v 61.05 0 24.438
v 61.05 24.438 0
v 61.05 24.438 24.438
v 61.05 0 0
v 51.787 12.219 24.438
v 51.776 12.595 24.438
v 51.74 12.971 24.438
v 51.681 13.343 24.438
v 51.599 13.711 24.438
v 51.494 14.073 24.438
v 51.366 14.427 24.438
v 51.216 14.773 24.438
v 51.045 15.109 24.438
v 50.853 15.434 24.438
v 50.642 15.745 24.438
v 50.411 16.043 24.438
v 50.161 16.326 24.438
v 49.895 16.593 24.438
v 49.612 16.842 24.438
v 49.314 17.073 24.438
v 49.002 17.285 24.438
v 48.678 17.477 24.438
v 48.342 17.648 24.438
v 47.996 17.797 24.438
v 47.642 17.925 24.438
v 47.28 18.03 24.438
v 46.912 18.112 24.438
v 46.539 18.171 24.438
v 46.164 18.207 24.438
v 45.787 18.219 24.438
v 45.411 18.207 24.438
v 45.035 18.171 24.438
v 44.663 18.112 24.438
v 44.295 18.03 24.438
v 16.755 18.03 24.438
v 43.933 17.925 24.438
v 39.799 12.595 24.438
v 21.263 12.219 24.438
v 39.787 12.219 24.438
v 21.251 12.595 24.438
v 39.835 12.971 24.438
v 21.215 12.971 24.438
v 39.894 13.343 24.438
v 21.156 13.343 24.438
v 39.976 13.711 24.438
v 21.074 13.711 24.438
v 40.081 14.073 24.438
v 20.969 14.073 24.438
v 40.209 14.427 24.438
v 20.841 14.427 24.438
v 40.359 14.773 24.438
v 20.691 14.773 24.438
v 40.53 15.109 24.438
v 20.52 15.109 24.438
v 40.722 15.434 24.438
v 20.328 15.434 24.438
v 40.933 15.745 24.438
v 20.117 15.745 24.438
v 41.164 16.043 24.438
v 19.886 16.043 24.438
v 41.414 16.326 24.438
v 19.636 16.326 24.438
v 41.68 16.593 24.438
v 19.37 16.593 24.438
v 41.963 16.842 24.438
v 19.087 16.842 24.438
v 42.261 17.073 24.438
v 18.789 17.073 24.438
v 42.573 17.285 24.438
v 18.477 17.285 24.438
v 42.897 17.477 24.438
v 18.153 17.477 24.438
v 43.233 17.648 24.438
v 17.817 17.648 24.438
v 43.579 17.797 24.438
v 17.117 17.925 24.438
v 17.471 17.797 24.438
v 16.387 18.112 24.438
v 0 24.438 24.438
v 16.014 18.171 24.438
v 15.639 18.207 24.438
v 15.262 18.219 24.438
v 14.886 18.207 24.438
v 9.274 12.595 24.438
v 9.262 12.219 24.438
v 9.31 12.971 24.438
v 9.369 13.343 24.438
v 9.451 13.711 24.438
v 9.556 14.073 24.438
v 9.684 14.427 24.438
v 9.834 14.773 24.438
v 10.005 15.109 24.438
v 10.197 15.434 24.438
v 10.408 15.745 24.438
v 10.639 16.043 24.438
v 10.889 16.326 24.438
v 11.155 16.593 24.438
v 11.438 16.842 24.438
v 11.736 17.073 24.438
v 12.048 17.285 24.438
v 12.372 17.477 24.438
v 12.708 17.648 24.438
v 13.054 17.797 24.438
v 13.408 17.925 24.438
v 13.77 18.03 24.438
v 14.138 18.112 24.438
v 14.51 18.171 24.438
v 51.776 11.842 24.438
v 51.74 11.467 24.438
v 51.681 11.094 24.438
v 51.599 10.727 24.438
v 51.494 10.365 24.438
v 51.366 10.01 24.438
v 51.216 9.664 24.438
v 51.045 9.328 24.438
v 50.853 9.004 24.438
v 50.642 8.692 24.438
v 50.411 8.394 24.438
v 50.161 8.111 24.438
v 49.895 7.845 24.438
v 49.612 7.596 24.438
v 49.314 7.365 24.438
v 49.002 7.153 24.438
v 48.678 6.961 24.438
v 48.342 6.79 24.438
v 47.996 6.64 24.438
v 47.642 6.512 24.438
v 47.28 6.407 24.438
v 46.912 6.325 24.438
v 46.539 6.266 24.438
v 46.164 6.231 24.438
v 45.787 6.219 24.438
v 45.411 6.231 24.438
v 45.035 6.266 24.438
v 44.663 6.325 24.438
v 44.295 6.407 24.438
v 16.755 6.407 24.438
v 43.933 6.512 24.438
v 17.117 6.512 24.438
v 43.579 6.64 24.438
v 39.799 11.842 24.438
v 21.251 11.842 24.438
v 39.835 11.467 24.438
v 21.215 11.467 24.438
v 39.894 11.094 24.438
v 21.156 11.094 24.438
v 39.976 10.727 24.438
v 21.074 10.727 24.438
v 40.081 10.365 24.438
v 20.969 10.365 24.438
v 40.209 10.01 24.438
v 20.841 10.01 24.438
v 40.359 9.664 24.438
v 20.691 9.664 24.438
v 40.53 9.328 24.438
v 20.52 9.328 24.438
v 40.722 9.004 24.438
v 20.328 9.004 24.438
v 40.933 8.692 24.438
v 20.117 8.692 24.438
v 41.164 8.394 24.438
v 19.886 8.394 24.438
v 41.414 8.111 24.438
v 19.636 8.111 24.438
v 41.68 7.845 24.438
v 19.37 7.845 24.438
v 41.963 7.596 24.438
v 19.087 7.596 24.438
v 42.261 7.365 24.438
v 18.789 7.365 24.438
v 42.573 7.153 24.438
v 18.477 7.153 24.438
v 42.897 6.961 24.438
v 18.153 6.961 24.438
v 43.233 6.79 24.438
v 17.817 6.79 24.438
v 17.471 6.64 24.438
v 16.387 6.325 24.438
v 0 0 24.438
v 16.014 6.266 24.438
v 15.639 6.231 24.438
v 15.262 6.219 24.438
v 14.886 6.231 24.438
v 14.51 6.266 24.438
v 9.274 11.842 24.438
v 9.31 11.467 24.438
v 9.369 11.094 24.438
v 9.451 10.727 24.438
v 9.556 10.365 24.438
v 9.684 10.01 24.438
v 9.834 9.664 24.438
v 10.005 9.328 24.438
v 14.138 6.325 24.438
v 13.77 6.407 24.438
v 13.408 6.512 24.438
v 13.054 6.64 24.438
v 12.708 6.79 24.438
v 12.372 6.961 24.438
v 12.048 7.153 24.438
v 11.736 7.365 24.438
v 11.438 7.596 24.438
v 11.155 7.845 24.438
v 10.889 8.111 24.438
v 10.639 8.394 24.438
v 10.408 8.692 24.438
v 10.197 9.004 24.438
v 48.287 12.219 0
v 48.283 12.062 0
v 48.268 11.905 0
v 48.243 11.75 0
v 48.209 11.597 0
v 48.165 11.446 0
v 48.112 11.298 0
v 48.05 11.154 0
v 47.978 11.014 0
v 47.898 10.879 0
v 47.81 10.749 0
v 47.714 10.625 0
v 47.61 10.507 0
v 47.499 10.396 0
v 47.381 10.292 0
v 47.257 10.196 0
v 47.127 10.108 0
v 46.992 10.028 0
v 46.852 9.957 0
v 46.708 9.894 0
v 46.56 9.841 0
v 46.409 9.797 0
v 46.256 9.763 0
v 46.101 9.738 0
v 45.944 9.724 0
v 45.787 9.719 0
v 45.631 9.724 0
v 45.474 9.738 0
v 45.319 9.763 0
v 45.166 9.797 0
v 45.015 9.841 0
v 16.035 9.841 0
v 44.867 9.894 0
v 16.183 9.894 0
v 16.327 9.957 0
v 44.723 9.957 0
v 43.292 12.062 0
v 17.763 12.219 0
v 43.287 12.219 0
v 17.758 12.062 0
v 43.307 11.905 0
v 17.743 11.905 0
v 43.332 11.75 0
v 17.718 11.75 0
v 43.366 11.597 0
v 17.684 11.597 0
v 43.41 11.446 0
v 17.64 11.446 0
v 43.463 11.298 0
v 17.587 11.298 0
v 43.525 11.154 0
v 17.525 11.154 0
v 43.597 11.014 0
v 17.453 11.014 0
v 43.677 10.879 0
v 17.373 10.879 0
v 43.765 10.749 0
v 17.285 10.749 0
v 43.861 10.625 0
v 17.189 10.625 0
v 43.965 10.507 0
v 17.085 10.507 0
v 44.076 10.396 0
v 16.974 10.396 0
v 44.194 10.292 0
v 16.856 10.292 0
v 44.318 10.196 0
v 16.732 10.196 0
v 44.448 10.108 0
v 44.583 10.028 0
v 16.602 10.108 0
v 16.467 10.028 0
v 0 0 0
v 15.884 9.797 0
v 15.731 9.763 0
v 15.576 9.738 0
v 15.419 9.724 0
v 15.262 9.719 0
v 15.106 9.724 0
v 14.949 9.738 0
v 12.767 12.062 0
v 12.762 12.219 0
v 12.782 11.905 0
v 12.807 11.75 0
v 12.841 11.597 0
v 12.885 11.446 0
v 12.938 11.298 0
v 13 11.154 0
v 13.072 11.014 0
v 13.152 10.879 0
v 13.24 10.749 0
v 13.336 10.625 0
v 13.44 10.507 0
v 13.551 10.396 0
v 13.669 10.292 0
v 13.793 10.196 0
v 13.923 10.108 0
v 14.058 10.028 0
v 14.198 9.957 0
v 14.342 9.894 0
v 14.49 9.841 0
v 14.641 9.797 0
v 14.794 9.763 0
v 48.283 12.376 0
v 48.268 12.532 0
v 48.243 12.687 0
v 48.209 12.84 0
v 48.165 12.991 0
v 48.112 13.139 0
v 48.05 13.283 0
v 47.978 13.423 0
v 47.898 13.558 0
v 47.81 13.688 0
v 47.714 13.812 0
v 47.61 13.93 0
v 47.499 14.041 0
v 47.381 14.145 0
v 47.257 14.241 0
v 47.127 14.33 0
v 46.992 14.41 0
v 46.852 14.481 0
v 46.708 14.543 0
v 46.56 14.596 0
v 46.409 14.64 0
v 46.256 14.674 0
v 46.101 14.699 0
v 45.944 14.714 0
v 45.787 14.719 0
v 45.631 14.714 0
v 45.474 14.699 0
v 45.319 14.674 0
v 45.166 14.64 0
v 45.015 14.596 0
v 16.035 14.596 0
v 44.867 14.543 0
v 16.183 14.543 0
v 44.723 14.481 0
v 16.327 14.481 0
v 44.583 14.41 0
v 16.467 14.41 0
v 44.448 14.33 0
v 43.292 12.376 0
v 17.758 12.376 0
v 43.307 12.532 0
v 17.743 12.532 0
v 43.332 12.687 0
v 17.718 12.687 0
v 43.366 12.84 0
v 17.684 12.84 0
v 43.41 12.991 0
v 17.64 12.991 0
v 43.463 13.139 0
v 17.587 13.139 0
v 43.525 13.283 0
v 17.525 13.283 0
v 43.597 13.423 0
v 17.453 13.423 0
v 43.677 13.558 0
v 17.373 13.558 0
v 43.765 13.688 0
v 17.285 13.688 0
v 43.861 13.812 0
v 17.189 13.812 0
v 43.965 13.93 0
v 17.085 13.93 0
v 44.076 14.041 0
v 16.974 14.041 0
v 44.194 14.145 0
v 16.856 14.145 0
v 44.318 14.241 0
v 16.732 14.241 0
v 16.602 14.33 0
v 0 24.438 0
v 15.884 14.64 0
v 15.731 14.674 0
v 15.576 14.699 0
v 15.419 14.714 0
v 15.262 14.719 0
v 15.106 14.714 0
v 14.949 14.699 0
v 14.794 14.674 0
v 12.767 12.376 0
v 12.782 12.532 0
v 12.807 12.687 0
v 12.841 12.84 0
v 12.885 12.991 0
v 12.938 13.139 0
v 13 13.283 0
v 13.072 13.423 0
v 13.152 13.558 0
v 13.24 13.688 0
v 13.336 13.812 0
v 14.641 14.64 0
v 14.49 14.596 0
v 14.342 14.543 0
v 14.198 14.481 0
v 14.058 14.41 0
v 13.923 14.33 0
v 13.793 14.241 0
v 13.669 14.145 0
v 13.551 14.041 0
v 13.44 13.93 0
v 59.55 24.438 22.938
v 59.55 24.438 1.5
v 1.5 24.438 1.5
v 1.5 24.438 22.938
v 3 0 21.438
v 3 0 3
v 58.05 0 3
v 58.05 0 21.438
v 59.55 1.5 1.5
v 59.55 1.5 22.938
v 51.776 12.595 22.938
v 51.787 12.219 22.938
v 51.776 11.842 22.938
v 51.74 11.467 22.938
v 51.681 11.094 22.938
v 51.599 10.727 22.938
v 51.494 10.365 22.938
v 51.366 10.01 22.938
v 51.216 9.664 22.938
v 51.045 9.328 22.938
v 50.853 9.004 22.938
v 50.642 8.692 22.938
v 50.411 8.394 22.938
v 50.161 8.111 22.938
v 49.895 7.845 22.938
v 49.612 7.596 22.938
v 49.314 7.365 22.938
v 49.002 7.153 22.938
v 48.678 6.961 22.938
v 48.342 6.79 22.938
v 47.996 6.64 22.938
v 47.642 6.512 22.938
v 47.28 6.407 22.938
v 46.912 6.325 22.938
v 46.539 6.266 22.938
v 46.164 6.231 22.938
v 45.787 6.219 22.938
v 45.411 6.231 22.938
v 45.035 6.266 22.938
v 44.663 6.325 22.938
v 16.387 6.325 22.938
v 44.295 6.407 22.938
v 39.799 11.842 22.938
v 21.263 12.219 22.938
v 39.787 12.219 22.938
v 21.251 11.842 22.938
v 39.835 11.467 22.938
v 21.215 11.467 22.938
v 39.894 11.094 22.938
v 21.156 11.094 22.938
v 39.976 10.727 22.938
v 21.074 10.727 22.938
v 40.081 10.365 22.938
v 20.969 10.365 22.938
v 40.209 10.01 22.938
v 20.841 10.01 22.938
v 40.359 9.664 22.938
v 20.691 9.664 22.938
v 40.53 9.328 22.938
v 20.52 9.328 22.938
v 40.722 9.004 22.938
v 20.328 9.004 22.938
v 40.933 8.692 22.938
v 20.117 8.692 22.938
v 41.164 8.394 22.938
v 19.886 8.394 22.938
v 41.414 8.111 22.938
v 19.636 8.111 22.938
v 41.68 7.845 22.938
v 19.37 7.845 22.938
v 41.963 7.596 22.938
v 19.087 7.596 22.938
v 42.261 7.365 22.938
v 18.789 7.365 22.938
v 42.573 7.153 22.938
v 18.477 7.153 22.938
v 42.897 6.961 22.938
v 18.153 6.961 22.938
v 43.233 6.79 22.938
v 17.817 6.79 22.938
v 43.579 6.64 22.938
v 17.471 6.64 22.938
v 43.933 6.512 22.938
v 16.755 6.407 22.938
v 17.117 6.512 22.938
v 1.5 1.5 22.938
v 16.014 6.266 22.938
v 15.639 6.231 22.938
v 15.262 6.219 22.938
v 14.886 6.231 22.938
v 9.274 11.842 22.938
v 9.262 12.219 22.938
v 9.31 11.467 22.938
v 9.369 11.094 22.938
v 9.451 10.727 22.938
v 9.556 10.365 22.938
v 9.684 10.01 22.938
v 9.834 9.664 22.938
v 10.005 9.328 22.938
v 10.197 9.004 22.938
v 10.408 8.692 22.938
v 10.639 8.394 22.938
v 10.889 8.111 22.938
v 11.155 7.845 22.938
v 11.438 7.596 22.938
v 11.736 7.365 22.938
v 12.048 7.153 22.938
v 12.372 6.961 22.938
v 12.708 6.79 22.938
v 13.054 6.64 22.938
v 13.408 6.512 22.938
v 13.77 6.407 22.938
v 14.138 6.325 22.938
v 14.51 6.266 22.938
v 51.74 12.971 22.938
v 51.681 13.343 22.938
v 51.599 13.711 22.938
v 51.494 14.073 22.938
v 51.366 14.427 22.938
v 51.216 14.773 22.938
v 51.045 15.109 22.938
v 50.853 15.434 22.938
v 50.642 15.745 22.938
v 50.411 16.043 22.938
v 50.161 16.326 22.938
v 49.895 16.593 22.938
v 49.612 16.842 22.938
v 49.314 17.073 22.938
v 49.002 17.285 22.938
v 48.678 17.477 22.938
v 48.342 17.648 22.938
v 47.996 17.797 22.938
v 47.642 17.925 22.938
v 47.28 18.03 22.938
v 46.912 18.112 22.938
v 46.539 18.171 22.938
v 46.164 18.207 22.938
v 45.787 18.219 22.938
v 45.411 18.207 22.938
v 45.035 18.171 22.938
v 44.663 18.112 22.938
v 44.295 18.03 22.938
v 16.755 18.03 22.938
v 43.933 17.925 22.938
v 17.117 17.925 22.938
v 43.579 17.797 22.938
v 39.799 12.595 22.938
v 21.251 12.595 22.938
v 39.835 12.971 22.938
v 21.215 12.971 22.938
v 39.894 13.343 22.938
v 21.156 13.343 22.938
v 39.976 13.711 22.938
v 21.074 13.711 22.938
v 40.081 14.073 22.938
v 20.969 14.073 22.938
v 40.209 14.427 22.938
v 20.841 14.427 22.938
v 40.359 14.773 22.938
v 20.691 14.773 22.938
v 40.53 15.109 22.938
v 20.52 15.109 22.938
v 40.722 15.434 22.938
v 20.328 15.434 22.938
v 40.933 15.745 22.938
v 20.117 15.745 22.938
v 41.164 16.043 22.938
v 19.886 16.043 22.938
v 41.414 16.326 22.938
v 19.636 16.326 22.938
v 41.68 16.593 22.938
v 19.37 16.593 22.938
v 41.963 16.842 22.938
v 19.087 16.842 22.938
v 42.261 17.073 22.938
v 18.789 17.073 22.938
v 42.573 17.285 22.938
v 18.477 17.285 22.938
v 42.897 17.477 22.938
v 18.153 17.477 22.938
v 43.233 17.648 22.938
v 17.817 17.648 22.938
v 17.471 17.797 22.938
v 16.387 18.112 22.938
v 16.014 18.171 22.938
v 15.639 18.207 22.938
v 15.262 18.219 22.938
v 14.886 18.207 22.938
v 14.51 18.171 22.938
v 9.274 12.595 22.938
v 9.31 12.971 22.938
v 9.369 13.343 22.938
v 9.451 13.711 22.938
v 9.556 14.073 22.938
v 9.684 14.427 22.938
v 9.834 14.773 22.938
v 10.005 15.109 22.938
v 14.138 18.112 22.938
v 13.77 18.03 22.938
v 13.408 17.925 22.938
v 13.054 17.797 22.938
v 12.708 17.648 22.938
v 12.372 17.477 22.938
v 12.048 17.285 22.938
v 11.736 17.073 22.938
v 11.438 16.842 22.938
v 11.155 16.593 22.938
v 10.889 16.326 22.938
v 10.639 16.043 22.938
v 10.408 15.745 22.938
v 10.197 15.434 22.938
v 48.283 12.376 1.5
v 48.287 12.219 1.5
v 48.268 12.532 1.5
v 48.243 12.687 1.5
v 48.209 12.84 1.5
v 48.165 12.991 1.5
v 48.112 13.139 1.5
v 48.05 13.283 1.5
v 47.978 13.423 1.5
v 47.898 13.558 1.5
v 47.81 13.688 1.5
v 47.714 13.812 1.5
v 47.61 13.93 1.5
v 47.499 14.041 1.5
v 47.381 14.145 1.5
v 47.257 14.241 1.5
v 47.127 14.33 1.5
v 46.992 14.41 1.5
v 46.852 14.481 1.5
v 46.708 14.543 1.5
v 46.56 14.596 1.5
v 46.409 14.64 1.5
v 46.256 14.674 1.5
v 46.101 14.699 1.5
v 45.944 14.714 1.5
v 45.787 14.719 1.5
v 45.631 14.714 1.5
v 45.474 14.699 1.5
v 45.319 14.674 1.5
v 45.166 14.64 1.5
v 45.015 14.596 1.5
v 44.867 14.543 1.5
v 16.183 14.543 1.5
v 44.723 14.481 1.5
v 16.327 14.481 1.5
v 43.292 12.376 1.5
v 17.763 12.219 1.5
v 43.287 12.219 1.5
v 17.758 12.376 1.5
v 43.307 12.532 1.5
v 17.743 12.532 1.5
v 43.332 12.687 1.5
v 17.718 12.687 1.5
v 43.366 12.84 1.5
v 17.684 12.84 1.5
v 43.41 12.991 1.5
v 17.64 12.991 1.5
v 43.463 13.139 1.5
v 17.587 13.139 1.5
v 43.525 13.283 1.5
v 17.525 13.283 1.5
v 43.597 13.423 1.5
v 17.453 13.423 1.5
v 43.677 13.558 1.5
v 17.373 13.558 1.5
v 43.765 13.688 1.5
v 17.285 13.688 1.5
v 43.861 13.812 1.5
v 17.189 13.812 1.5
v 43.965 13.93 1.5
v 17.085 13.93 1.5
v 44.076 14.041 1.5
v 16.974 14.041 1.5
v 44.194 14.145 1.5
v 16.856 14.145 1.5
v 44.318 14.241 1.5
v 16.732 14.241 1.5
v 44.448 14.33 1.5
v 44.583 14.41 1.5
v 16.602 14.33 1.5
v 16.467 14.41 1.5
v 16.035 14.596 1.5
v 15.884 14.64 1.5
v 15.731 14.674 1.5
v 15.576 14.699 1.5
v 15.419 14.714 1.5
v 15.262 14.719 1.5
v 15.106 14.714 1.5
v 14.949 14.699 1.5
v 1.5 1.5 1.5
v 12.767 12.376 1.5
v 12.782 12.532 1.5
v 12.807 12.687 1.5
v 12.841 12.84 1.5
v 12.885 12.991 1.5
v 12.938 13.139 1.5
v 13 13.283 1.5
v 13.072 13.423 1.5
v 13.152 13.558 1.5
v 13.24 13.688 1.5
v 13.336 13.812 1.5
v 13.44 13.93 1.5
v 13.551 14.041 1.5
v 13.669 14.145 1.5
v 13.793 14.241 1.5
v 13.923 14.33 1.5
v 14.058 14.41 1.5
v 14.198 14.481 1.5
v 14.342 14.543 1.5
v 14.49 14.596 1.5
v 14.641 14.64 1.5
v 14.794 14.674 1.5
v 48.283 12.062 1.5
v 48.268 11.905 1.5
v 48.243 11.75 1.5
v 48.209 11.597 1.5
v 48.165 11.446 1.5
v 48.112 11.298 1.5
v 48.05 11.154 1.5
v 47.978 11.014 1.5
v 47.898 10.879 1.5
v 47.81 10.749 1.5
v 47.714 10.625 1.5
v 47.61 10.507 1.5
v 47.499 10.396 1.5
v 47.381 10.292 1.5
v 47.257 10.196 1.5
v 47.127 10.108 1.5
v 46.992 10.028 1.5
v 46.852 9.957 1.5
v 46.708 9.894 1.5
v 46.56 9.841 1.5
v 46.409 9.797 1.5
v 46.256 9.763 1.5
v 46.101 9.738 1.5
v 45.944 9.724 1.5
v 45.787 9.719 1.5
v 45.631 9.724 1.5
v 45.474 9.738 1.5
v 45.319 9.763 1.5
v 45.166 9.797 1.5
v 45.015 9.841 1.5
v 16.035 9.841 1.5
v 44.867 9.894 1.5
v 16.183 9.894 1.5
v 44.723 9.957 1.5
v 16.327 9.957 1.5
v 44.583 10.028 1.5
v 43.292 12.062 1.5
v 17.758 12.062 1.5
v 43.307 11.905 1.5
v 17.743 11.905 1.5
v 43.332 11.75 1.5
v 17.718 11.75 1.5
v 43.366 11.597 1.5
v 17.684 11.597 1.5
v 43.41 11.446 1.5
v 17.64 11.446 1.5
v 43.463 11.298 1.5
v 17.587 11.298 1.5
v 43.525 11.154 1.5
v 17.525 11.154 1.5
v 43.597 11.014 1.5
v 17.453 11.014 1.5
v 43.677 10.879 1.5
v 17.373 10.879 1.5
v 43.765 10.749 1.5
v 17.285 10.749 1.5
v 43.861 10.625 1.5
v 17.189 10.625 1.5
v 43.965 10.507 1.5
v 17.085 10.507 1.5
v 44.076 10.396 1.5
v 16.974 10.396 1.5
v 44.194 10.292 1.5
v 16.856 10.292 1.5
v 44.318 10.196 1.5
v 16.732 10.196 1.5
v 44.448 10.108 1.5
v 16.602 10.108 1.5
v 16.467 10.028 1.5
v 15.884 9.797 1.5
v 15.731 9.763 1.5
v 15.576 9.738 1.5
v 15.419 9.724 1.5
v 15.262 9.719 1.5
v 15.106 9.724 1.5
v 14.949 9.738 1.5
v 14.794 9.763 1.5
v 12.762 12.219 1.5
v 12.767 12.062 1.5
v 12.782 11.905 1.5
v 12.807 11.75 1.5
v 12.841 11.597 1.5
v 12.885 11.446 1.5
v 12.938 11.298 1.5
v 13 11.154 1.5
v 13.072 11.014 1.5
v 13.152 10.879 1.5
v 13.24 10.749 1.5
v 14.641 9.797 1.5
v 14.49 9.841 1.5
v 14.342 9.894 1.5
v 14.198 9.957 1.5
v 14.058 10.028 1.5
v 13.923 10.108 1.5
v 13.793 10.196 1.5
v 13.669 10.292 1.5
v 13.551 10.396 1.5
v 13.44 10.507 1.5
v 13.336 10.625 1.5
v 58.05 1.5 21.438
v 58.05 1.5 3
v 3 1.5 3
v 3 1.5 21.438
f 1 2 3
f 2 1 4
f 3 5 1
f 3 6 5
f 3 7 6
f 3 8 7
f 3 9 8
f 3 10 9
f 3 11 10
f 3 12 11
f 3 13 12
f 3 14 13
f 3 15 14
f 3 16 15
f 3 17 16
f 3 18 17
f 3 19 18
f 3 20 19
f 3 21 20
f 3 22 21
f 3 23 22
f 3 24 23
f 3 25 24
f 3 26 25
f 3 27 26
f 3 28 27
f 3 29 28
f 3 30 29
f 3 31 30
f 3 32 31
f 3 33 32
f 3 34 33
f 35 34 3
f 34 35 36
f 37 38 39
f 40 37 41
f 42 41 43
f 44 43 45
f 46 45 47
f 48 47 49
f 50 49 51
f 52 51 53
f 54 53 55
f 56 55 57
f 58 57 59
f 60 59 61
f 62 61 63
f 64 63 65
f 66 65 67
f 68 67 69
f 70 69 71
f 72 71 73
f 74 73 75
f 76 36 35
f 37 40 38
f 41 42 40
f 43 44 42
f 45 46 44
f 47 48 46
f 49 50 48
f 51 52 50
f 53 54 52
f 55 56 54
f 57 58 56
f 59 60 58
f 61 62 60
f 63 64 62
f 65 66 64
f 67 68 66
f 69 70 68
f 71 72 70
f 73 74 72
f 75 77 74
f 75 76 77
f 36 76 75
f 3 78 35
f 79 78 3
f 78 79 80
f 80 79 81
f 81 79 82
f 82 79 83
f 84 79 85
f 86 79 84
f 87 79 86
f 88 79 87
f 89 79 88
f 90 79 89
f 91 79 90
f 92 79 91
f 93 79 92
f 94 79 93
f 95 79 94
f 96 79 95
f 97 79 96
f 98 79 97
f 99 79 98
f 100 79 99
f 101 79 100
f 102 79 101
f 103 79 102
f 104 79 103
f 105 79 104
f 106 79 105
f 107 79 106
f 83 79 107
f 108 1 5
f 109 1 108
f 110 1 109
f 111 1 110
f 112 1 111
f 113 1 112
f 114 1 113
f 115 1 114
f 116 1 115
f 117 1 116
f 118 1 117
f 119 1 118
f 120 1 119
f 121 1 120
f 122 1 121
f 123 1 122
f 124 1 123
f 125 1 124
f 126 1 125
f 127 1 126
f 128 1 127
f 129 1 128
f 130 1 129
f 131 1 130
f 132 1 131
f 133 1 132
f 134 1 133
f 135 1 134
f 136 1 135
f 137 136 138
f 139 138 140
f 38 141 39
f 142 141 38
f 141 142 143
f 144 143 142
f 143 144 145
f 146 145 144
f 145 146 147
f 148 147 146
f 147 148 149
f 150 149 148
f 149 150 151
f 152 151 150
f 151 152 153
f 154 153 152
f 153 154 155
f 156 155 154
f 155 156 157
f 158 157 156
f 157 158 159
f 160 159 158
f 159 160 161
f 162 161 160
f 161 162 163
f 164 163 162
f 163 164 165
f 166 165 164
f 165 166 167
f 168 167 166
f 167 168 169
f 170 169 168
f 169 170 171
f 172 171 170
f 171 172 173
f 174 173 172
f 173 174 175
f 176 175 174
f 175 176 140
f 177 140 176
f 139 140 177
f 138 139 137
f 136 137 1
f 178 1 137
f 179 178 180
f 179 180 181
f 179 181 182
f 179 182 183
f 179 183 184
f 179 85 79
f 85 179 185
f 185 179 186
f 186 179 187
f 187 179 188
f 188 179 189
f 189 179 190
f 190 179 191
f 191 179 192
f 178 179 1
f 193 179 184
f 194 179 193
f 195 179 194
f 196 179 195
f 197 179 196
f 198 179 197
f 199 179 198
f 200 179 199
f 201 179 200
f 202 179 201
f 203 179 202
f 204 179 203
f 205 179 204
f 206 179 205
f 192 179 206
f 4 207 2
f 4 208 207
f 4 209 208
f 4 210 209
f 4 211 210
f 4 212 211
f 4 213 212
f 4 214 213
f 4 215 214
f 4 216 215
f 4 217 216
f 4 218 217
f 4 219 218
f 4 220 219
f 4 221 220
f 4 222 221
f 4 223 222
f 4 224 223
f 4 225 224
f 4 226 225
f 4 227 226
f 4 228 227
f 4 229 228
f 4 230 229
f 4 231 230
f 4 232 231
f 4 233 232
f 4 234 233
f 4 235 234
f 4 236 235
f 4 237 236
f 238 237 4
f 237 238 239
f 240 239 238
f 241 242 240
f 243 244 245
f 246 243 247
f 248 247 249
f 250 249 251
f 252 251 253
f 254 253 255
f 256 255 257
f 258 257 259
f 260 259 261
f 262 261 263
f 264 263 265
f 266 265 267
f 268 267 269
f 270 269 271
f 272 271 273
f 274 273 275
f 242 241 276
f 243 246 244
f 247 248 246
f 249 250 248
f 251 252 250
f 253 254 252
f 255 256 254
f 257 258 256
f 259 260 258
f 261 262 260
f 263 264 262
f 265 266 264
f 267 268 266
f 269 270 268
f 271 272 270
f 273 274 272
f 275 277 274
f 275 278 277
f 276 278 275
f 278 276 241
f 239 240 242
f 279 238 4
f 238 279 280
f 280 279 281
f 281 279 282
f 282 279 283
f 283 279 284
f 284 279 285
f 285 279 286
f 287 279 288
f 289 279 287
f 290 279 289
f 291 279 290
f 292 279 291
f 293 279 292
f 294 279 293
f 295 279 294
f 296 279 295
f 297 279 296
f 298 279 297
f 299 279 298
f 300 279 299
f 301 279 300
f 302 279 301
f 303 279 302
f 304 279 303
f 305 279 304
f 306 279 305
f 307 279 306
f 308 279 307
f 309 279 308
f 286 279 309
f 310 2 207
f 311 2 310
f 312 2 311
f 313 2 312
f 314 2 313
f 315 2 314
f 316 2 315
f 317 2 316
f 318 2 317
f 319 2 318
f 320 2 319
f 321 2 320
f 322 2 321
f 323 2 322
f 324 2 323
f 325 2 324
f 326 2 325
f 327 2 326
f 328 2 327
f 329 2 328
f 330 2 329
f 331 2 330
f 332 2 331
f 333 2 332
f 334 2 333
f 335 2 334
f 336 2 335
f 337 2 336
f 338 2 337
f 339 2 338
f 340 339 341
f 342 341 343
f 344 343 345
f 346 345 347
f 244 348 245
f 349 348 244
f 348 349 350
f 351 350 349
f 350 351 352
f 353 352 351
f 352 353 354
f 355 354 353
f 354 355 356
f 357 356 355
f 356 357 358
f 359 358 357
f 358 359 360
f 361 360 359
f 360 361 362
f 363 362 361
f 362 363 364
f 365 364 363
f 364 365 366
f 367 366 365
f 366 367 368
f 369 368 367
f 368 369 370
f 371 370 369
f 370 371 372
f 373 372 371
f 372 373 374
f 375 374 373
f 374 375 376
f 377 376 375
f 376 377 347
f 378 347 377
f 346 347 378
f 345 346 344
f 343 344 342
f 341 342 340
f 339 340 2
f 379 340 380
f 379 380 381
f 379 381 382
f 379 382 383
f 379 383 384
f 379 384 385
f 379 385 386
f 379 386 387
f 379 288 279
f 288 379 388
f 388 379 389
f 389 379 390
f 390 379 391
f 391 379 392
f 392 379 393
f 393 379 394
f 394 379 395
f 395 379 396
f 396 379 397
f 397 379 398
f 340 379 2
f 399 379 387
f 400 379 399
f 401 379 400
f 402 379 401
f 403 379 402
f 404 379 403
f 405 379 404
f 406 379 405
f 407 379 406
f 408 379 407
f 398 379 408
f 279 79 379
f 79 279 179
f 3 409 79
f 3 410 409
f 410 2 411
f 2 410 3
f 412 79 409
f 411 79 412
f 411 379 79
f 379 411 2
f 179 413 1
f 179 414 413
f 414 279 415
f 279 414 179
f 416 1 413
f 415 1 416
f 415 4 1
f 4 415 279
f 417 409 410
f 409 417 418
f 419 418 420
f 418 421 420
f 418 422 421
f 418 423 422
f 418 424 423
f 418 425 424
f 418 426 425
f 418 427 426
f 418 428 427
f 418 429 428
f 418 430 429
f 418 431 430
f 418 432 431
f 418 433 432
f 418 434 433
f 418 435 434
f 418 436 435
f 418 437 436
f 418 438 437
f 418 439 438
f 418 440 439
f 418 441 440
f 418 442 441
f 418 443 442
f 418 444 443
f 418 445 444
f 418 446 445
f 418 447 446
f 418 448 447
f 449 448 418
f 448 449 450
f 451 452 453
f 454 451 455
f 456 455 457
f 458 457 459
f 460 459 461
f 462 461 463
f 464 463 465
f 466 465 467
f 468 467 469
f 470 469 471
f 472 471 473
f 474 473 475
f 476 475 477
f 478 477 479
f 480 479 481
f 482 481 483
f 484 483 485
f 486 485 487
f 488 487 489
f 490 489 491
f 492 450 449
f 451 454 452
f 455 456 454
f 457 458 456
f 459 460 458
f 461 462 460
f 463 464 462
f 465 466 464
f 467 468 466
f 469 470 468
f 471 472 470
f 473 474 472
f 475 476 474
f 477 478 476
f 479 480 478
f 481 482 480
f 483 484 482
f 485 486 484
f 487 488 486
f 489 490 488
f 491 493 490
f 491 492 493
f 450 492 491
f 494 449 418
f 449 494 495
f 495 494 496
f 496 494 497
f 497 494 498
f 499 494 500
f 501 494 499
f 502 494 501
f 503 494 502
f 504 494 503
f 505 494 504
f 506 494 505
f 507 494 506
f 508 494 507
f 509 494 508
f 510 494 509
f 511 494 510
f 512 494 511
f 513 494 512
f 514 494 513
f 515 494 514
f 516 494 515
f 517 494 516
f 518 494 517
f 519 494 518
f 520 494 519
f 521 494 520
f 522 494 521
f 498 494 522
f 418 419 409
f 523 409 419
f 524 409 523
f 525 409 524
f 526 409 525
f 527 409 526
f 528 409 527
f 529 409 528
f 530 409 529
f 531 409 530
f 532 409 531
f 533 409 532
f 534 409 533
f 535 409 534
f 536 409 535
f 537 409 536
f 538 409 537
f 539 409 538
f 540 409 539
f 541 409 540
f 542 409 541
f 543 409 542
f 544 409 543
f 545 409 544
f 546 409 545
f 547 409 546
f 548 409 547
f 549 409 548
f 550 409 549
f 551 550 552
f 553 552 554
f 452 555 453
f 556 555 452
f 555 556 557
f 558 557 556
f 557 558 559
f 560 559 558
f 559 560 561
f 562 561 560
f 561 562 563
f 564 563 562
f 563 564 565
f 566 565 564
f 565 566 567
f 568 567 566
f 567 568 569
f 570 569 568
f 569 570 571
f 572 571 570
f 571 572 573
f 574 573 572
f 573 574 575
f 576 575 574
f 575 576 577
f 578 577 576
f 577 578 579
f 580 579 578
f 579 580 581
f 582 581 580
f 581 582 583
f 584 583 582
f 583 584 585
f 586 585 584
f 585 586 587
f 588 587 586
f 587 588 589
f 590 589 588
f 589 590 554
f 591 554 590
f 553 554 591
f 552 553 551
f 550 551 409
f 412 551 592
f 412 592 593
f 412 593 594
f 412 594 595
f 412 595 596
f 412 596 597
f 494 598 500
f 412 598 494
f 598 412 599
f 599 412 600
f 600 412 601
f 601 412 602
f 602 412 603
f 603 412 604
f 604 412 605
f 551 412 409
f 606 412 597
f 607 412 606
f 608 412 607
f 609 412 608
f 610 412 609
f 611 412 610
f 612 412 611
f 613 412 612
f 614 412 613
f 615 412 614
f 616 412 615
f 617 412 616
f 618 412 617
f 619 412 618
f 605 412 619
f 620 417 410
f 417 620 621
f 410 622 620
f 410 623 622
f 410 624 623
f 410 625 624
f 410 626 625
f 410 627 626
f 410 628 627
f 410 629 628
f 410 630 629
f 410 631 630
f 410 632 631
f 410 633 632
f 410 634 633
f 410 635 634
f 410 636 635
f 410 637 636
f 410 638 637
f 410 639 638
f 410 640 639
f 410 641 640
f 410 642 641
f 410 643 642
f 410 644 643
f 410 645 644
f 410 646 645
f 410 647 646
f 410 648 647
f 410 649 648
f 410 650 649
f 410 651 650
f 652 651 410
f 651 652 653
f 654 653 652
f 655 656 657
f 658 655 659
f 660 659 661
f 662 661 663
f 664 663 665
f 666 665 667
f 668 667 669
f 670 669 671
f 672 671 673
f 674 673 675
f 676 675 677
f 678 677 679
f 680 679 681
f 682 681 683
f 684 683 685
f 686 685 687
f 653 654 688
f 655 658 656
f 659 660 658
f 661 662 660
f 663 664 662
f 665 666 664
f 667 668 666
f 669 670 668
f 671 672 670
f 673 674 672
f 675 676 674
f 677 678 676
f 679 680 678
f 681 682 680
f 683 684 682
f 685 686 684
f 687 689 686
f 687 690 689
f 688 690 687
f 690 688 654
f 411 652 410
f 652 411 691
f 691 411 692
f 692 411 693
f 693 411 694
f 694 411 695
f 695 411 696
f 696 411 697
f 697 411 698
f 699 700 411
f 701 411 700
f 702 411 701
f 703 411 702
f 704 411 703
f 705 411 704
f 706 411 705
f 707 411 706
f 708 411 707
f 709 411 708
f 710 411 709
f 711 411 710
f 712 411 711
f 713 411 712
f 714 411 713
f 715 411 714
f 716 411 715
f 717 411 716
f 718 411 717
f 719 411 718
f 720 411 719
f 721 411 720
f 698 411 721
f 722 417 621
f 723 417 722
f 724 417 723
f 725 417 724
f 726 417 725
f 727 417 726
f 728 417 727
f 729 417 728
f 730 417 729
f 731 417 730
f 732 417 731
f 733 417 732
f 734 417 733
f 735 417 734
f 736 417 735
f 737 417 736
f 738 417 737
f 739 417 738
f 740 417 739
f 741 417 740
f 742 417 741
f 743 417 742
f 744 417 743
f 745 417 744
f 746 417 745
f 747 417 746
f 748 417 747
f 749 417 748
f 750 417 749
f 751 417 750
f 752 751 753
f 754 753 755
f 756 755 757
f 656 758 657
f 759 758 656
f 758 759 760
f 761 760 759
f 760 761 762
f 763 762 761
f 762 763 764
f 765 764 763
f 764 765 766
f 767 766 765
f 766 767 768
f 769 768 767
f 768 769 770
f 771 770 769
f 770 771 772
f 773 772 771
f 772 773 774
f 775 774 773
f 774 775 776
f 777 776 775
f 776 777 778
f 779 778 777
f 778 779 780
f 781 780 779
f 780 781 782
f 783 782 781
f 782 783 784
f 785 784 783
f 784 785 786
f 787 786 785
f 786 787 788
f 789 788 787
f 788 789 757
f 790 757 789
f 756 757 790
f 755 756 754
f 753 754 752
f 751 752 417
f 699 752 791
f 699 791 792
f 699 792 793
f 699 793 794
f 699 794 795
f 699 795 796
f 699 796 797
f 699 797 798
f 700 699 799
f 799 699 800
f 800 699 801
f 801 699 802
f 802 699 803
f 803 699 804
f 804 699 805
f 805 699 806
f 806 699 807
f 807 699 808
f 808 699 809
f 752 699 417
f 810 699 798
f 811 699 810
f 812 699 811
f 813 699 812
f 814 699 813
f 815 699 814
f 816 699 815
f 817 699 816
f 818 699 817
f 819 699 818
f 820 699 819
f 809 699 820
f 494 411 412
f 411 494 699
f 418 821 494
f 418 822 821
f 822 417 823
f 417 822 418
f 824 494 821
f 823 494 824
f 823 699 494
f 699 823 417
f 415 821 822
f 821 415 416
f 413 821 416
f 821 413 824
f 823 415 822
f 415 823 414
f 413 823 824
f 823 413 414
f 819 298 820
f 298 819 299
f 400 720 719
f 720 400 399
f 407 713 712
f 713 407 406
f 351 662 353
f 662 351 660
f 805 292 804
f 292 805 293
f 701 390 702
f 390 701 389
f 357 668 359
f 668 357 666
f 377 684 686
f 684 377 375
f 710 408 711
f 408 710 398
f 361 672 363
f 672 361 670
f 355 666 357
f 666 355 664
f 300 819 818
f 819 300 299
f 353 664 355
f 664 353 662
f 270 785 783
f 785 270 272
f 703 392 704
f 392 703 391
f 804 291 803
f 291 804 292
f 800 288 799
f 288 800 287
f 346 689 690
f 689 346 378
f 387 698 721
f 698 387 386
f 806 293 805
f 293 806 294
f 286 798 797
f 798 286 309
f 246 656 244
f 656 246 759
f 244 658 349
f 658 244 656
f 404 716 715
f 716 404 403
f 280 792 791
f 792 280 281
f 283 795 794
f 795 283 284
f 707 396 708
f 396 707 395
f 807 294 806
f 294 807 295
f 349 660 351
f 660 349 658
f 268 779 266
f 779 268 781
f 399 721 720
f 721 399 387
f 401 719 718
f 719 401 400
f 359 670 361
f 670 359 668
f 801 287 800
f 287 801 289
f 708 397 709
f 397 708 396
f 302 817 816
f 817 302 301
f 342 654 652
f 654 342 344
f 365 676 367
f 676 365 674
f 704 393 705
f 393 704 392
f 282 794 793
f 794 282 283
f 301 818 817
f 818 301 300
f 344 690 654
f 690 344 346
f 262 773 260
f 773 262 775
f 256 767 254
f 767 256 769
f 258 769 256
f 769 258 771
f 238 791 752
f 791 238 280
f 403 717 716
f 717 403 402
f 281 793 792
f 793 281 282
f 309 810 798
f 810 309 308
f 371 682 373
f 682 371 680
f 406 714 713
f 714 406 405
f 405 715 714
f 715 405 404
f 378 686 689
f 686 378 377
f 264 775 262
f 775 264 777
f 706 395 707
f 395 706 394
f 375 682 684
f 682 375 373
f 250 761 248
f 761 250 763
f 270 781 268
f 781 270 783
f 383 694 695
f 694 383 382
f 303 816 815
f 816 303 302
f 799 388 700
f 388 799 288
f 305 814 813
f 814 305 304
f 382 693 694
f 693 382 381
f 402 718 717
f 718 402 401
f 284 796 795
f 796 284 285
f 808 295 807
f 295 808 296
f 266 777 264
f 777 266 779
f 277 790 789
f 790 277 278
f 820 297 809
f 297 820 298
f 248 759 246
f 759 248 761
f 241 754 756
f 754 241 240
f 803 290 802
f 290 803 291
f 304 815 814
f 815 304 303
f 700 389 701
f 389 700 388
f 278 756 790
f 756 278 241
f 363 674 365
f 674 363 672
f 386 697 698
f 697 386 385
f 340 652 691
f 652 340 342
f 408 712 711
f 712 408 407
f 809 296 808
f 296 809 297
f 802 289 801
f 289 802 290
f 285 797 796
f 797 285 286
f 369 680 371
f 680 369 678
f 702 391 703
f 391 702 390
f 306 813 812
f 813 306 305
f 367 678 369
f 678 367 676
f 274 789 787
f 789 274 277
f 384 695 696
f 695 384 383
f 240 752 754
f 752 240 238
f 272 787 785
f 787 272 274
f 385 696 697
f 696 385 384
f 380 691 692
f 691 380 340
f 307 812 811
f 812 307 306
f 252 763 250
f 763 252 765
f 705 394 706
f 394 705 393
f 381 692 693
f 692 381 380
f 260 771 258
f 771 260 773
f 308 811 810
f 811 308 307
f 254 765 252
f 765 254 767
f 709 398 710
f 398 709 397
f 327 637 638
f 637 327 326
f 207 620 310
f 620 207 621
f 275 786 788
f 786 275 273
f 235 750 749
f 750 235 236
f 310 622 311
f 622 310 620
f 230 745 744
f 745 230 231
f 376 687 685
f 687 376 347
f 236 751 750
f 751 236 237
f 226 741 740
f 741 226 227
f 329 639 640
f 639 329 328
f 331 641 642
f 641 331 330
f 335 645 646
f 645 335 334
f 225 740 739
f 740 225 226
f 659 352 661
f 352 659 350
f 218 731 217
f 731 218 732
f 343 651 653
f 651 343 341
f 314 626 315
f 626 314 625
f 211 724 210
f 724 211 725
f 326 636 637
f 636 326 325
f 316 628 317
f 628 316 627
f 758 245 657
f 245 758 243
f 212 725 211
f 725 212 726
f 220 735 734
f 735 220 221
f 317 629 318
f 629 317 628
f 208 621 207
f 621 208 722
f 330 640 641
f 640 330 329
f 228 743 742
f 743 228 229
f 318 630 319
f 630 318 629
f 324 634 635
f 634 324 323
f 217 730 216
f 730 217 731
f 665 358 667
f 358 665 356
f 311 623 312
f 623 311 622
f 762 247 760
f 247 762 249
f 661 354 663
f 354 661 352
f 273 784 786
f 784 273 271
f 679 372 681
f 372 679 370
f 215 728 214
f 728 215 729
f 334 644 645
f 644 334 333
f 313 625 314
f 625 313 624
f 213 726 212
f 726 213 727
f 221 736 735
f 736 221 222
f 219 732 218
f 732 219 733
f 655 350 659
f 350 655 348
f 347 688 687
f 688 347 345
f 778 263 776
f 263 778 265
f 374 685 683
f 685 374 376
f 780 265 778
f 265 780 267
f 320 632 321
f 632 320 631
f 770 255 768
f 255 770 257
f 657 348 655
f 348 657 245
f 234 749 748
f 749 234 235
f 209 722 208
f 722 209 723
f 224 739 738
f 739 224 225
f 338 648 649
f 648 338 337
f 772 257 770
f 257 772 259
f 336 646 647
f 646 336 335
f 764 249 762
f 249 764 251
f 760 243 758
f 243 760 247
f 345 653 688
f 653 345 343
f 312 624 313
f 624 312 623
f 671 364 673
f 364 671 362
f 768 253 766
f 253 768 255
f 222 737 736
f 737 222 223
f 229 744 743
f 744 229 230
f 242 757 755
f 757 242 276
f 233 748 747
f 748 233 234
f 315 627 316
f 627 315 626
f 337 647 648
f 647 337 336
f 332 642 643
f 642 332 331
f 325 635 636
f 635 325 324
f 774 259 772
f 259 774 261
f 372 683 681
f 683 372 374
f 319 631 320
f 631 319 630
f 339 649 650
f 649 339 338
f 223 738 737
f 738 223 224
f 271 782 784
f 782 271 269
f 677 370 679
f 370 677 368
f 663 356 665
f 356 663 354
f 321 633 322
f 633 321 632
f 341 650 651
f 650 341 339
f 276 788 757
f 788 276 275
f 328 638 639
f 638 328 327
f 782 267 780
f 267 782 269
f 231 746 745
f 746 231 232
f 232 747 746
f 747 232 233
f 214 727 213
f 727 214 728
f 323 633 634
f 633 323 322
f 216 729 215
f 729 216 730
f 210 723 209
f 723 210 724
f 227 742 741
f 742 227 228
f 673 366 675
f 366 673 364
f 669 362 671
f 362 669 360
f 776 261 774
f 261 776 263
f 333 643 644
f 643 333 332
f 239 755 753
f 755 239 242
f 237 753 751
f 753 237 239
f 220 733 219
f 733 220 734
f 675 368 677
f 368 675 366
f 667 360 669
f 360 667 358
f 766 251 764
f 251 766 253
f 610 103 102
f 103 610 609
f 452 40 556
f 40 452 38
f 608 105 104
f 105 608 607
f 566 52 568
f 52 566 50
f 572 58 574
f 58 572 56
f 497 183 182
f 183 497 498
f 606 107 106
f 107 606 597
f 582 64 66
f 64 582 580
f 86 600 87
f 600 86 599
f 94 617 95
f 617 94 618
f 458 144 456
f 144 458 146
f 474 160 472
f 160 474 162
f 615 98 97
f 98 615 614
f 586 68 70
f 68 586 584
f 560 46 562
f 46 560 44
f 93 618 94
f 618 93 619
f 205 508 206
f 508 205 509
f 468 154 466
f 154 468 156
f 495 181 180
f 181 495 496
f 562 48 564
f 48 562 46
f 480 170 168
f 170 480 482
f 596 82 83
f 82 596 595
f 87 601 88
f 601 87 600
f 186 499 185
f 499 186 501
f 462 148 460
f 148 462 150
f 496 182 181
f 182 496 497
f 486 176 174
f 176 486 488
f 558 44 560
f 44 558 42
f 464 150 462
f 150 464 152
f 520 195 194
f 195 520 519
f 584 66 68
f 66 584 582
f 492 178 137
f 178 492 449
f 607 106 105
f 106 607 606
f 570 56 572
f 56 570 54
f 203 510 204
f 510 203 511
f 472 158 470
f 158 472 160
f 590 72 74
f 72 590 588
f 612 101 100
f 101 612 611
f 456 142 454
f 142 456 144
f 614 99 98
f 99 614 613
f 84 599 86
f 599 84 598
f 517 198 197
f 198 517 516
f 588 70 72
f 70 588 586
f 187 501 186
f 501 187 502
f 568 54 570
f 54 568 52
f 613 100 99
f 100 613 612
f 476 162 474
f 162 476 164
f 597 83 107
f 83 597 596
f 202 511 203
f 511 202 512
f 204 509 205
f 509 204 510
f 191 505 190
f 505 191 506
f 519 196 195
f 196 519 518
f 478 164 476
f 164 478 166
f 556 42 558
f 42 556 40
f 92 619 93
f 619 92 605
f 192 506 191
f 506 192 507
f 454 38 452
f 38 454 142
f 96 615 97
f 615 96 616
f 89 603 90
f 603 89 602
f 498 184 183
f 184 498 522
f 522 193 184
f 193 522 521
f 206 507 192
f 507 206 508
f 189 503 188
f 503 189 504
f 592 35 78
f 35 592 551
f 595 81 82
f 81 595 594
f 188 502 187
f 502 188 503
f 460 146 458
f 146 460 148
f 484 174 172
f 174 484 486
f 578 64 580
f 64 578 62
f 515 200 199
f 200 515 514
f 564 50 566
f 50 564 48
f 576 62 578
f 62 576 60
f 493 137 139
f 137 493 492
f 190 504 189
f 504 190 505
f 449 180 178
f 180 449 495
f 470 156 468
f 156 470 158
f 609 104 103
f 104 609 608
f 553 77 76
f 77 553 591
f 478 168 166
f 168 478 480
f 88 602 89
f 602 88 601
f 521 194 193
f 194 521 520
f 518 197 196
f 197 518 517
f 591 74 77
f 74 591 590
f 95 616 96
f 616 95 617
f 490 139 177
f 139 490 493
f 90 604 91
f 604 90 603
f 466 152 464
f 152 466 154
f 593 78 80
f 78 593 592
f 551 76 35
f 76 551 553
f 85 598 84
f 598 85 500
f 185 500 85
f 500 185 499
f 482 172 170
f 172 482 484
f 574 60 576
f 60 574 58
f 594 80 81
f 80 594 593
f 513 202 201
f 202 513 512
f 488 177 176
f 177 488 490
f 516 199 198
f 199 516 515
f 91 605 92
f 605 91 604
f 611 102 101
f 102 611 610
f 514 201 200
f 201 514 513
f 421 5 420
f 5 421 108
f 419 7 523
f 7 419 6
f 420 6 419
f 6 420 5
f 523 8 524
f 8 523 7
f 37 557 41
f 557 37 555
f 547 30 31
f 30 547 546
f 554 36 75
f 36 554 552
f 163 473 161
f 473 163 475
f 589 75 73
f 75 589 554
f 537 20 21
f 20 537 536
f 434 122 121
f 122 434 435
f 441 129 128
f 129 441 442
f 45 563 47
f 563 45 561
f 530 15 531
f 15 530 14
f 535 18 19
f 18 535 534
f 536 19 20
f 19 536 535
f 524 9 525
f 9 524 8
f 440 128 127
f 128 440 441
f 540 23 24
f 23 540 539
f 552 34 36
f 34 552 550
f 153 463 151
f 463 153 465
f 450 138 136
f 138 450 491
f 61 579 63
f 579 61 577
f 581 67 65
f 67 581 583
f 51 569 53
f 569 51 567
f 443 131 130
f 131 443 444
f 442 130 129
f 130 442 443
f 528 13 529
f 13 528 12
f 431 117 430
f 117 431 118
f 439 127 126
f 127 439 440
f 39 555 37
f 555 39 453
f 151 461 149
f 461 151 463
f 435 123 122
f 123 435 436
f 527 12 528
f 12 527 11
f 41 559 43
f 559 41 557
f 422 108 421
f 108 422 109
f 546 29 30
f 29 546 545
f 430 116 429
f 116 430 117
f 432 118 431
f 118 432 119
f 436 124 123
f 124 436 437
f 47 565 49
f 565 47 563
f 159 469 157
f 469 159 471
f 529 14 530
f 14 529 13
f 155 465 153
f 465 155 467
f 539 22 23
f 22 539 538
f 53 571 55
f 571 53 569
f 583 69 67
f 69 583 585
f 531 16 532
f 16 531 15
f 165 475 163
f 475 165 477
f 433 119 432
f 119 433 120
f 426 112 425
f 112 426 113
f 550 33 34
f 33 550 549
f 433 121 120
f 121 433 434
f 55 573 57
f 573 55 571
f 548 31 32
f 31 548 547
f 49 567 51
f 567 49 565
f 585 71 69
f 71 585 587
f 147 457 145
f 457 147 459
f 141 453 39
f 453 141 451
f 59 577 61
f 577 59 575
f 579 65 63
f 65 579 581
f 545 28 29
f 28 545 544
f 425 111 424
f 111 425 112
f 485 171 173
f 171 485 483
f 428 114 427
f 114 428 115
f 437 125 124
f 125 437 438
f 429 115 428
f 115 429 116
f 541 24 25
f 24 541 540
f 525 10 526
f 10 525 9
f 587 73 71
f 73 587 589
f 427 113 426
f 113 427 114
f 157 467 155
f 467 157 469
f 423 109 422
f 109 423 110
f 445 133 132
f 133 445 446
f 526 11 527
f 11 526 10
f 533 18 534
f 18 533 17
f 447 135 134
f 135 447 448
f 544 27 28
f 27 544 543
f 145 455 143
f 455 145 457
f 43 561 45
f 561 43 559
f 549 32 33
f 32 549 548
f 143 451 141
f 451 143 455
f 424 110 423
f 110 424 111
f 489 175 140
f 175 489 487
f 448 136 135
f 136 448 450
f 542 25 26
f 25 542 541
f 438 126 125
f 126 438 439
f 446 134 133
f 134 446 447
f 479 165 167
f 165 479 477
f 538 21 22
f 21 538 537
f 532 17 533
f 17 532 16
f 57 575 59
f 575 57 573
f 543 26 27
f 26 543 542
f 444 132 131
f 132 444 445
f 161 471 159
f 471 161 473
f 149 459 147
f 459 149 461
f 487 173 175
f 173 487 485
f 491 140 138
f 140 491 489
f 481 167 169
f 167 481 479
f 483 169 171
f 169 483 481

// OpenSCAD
// file: defines.scad
// External measurements from the magnetic knife holder (in inches)

LENGTH_INCHES  = 13 + 3/4;
HEIGHT_INCHES  = 2 + 1/4;
DEPTH_INCHES   = 13/16;
SPACING_INCHES = 13/16;

INCHES_TO_MM = 25.4 / 1; // mm per inch

// Below here is in mm
// Interface to the Block

LENGTH  = LENGTH_INCHES * INCHES_TO_MM;
HEIGHT  = HEIGHT_INCHES * INCHES_TO_MM;
DEPTH   = DEPTH_INCHES * INCHES_TO_MM;
SPACING = SPACING_INCHES * INCHES_TO_MM;

MOUNT_LENGTH = SPACING;

PAD_H = 0.9; // What to pad HEIGHT by
PAD_L = 0.8; // What to pad LENGTH by
PAD_D = 0.8; // What to pad DEPTH by

WALL = 1.5; // Wall thickness

// Custom section
// Screw mount bits

CUSTOM = SPACING; 
HOLE =  5; // Diameter of the screw holes
HEAD = 12; // Diameter of the screw holes head (for chamfer0
// main file
include <defines.scad>

module one_hole(height, length, depth, wall, hole, head) {
    h = height + (2*wall);
    l = length + (2*wall);
    d = depth  + (2*wall);

    assert(l > hole);
    assert(l > head);

    difference() {
        cube([h, l, d]);
        translate([wall, wall, wall]) {
            cube([height, 2*length, depth]);
        };

        translate([2*wall, -4*wall, 2*wall]) {
            cube([height-(2*wall), length, depth-(2*wall)]);
        };

        // BOTTOM HOLES
        translate([h*(1/4), l*(1/2), -2*wall]) {
            cylinder(h=4*wall, d=hole, $fn=100);
        };
        translate([h*(3/4), l*(1/2), -2*wall]) {
            cylinder(h=4*wall, d=hole, $fn=100);
        };

        // TOP HOLES
        // (Bigger for tool access)
        translate([h*(1/4), l*(1/2), d-2*wall]) {
            cylinder(h=4*wall, d=head, $fn=100);
        };
        translate([h*(3/4), l*(1/2), d-2*wall]) {
            cylinder(h=4*wall, d=head, $fn=100);
        };
    }
}

one_hole(
    HEIGHT+PAD_H, 
    MOUNT_LENGTH+PAD_L, 
    DEPTH+PAD_D, 
    WALL,
    HOLE,
    HEAD
);
